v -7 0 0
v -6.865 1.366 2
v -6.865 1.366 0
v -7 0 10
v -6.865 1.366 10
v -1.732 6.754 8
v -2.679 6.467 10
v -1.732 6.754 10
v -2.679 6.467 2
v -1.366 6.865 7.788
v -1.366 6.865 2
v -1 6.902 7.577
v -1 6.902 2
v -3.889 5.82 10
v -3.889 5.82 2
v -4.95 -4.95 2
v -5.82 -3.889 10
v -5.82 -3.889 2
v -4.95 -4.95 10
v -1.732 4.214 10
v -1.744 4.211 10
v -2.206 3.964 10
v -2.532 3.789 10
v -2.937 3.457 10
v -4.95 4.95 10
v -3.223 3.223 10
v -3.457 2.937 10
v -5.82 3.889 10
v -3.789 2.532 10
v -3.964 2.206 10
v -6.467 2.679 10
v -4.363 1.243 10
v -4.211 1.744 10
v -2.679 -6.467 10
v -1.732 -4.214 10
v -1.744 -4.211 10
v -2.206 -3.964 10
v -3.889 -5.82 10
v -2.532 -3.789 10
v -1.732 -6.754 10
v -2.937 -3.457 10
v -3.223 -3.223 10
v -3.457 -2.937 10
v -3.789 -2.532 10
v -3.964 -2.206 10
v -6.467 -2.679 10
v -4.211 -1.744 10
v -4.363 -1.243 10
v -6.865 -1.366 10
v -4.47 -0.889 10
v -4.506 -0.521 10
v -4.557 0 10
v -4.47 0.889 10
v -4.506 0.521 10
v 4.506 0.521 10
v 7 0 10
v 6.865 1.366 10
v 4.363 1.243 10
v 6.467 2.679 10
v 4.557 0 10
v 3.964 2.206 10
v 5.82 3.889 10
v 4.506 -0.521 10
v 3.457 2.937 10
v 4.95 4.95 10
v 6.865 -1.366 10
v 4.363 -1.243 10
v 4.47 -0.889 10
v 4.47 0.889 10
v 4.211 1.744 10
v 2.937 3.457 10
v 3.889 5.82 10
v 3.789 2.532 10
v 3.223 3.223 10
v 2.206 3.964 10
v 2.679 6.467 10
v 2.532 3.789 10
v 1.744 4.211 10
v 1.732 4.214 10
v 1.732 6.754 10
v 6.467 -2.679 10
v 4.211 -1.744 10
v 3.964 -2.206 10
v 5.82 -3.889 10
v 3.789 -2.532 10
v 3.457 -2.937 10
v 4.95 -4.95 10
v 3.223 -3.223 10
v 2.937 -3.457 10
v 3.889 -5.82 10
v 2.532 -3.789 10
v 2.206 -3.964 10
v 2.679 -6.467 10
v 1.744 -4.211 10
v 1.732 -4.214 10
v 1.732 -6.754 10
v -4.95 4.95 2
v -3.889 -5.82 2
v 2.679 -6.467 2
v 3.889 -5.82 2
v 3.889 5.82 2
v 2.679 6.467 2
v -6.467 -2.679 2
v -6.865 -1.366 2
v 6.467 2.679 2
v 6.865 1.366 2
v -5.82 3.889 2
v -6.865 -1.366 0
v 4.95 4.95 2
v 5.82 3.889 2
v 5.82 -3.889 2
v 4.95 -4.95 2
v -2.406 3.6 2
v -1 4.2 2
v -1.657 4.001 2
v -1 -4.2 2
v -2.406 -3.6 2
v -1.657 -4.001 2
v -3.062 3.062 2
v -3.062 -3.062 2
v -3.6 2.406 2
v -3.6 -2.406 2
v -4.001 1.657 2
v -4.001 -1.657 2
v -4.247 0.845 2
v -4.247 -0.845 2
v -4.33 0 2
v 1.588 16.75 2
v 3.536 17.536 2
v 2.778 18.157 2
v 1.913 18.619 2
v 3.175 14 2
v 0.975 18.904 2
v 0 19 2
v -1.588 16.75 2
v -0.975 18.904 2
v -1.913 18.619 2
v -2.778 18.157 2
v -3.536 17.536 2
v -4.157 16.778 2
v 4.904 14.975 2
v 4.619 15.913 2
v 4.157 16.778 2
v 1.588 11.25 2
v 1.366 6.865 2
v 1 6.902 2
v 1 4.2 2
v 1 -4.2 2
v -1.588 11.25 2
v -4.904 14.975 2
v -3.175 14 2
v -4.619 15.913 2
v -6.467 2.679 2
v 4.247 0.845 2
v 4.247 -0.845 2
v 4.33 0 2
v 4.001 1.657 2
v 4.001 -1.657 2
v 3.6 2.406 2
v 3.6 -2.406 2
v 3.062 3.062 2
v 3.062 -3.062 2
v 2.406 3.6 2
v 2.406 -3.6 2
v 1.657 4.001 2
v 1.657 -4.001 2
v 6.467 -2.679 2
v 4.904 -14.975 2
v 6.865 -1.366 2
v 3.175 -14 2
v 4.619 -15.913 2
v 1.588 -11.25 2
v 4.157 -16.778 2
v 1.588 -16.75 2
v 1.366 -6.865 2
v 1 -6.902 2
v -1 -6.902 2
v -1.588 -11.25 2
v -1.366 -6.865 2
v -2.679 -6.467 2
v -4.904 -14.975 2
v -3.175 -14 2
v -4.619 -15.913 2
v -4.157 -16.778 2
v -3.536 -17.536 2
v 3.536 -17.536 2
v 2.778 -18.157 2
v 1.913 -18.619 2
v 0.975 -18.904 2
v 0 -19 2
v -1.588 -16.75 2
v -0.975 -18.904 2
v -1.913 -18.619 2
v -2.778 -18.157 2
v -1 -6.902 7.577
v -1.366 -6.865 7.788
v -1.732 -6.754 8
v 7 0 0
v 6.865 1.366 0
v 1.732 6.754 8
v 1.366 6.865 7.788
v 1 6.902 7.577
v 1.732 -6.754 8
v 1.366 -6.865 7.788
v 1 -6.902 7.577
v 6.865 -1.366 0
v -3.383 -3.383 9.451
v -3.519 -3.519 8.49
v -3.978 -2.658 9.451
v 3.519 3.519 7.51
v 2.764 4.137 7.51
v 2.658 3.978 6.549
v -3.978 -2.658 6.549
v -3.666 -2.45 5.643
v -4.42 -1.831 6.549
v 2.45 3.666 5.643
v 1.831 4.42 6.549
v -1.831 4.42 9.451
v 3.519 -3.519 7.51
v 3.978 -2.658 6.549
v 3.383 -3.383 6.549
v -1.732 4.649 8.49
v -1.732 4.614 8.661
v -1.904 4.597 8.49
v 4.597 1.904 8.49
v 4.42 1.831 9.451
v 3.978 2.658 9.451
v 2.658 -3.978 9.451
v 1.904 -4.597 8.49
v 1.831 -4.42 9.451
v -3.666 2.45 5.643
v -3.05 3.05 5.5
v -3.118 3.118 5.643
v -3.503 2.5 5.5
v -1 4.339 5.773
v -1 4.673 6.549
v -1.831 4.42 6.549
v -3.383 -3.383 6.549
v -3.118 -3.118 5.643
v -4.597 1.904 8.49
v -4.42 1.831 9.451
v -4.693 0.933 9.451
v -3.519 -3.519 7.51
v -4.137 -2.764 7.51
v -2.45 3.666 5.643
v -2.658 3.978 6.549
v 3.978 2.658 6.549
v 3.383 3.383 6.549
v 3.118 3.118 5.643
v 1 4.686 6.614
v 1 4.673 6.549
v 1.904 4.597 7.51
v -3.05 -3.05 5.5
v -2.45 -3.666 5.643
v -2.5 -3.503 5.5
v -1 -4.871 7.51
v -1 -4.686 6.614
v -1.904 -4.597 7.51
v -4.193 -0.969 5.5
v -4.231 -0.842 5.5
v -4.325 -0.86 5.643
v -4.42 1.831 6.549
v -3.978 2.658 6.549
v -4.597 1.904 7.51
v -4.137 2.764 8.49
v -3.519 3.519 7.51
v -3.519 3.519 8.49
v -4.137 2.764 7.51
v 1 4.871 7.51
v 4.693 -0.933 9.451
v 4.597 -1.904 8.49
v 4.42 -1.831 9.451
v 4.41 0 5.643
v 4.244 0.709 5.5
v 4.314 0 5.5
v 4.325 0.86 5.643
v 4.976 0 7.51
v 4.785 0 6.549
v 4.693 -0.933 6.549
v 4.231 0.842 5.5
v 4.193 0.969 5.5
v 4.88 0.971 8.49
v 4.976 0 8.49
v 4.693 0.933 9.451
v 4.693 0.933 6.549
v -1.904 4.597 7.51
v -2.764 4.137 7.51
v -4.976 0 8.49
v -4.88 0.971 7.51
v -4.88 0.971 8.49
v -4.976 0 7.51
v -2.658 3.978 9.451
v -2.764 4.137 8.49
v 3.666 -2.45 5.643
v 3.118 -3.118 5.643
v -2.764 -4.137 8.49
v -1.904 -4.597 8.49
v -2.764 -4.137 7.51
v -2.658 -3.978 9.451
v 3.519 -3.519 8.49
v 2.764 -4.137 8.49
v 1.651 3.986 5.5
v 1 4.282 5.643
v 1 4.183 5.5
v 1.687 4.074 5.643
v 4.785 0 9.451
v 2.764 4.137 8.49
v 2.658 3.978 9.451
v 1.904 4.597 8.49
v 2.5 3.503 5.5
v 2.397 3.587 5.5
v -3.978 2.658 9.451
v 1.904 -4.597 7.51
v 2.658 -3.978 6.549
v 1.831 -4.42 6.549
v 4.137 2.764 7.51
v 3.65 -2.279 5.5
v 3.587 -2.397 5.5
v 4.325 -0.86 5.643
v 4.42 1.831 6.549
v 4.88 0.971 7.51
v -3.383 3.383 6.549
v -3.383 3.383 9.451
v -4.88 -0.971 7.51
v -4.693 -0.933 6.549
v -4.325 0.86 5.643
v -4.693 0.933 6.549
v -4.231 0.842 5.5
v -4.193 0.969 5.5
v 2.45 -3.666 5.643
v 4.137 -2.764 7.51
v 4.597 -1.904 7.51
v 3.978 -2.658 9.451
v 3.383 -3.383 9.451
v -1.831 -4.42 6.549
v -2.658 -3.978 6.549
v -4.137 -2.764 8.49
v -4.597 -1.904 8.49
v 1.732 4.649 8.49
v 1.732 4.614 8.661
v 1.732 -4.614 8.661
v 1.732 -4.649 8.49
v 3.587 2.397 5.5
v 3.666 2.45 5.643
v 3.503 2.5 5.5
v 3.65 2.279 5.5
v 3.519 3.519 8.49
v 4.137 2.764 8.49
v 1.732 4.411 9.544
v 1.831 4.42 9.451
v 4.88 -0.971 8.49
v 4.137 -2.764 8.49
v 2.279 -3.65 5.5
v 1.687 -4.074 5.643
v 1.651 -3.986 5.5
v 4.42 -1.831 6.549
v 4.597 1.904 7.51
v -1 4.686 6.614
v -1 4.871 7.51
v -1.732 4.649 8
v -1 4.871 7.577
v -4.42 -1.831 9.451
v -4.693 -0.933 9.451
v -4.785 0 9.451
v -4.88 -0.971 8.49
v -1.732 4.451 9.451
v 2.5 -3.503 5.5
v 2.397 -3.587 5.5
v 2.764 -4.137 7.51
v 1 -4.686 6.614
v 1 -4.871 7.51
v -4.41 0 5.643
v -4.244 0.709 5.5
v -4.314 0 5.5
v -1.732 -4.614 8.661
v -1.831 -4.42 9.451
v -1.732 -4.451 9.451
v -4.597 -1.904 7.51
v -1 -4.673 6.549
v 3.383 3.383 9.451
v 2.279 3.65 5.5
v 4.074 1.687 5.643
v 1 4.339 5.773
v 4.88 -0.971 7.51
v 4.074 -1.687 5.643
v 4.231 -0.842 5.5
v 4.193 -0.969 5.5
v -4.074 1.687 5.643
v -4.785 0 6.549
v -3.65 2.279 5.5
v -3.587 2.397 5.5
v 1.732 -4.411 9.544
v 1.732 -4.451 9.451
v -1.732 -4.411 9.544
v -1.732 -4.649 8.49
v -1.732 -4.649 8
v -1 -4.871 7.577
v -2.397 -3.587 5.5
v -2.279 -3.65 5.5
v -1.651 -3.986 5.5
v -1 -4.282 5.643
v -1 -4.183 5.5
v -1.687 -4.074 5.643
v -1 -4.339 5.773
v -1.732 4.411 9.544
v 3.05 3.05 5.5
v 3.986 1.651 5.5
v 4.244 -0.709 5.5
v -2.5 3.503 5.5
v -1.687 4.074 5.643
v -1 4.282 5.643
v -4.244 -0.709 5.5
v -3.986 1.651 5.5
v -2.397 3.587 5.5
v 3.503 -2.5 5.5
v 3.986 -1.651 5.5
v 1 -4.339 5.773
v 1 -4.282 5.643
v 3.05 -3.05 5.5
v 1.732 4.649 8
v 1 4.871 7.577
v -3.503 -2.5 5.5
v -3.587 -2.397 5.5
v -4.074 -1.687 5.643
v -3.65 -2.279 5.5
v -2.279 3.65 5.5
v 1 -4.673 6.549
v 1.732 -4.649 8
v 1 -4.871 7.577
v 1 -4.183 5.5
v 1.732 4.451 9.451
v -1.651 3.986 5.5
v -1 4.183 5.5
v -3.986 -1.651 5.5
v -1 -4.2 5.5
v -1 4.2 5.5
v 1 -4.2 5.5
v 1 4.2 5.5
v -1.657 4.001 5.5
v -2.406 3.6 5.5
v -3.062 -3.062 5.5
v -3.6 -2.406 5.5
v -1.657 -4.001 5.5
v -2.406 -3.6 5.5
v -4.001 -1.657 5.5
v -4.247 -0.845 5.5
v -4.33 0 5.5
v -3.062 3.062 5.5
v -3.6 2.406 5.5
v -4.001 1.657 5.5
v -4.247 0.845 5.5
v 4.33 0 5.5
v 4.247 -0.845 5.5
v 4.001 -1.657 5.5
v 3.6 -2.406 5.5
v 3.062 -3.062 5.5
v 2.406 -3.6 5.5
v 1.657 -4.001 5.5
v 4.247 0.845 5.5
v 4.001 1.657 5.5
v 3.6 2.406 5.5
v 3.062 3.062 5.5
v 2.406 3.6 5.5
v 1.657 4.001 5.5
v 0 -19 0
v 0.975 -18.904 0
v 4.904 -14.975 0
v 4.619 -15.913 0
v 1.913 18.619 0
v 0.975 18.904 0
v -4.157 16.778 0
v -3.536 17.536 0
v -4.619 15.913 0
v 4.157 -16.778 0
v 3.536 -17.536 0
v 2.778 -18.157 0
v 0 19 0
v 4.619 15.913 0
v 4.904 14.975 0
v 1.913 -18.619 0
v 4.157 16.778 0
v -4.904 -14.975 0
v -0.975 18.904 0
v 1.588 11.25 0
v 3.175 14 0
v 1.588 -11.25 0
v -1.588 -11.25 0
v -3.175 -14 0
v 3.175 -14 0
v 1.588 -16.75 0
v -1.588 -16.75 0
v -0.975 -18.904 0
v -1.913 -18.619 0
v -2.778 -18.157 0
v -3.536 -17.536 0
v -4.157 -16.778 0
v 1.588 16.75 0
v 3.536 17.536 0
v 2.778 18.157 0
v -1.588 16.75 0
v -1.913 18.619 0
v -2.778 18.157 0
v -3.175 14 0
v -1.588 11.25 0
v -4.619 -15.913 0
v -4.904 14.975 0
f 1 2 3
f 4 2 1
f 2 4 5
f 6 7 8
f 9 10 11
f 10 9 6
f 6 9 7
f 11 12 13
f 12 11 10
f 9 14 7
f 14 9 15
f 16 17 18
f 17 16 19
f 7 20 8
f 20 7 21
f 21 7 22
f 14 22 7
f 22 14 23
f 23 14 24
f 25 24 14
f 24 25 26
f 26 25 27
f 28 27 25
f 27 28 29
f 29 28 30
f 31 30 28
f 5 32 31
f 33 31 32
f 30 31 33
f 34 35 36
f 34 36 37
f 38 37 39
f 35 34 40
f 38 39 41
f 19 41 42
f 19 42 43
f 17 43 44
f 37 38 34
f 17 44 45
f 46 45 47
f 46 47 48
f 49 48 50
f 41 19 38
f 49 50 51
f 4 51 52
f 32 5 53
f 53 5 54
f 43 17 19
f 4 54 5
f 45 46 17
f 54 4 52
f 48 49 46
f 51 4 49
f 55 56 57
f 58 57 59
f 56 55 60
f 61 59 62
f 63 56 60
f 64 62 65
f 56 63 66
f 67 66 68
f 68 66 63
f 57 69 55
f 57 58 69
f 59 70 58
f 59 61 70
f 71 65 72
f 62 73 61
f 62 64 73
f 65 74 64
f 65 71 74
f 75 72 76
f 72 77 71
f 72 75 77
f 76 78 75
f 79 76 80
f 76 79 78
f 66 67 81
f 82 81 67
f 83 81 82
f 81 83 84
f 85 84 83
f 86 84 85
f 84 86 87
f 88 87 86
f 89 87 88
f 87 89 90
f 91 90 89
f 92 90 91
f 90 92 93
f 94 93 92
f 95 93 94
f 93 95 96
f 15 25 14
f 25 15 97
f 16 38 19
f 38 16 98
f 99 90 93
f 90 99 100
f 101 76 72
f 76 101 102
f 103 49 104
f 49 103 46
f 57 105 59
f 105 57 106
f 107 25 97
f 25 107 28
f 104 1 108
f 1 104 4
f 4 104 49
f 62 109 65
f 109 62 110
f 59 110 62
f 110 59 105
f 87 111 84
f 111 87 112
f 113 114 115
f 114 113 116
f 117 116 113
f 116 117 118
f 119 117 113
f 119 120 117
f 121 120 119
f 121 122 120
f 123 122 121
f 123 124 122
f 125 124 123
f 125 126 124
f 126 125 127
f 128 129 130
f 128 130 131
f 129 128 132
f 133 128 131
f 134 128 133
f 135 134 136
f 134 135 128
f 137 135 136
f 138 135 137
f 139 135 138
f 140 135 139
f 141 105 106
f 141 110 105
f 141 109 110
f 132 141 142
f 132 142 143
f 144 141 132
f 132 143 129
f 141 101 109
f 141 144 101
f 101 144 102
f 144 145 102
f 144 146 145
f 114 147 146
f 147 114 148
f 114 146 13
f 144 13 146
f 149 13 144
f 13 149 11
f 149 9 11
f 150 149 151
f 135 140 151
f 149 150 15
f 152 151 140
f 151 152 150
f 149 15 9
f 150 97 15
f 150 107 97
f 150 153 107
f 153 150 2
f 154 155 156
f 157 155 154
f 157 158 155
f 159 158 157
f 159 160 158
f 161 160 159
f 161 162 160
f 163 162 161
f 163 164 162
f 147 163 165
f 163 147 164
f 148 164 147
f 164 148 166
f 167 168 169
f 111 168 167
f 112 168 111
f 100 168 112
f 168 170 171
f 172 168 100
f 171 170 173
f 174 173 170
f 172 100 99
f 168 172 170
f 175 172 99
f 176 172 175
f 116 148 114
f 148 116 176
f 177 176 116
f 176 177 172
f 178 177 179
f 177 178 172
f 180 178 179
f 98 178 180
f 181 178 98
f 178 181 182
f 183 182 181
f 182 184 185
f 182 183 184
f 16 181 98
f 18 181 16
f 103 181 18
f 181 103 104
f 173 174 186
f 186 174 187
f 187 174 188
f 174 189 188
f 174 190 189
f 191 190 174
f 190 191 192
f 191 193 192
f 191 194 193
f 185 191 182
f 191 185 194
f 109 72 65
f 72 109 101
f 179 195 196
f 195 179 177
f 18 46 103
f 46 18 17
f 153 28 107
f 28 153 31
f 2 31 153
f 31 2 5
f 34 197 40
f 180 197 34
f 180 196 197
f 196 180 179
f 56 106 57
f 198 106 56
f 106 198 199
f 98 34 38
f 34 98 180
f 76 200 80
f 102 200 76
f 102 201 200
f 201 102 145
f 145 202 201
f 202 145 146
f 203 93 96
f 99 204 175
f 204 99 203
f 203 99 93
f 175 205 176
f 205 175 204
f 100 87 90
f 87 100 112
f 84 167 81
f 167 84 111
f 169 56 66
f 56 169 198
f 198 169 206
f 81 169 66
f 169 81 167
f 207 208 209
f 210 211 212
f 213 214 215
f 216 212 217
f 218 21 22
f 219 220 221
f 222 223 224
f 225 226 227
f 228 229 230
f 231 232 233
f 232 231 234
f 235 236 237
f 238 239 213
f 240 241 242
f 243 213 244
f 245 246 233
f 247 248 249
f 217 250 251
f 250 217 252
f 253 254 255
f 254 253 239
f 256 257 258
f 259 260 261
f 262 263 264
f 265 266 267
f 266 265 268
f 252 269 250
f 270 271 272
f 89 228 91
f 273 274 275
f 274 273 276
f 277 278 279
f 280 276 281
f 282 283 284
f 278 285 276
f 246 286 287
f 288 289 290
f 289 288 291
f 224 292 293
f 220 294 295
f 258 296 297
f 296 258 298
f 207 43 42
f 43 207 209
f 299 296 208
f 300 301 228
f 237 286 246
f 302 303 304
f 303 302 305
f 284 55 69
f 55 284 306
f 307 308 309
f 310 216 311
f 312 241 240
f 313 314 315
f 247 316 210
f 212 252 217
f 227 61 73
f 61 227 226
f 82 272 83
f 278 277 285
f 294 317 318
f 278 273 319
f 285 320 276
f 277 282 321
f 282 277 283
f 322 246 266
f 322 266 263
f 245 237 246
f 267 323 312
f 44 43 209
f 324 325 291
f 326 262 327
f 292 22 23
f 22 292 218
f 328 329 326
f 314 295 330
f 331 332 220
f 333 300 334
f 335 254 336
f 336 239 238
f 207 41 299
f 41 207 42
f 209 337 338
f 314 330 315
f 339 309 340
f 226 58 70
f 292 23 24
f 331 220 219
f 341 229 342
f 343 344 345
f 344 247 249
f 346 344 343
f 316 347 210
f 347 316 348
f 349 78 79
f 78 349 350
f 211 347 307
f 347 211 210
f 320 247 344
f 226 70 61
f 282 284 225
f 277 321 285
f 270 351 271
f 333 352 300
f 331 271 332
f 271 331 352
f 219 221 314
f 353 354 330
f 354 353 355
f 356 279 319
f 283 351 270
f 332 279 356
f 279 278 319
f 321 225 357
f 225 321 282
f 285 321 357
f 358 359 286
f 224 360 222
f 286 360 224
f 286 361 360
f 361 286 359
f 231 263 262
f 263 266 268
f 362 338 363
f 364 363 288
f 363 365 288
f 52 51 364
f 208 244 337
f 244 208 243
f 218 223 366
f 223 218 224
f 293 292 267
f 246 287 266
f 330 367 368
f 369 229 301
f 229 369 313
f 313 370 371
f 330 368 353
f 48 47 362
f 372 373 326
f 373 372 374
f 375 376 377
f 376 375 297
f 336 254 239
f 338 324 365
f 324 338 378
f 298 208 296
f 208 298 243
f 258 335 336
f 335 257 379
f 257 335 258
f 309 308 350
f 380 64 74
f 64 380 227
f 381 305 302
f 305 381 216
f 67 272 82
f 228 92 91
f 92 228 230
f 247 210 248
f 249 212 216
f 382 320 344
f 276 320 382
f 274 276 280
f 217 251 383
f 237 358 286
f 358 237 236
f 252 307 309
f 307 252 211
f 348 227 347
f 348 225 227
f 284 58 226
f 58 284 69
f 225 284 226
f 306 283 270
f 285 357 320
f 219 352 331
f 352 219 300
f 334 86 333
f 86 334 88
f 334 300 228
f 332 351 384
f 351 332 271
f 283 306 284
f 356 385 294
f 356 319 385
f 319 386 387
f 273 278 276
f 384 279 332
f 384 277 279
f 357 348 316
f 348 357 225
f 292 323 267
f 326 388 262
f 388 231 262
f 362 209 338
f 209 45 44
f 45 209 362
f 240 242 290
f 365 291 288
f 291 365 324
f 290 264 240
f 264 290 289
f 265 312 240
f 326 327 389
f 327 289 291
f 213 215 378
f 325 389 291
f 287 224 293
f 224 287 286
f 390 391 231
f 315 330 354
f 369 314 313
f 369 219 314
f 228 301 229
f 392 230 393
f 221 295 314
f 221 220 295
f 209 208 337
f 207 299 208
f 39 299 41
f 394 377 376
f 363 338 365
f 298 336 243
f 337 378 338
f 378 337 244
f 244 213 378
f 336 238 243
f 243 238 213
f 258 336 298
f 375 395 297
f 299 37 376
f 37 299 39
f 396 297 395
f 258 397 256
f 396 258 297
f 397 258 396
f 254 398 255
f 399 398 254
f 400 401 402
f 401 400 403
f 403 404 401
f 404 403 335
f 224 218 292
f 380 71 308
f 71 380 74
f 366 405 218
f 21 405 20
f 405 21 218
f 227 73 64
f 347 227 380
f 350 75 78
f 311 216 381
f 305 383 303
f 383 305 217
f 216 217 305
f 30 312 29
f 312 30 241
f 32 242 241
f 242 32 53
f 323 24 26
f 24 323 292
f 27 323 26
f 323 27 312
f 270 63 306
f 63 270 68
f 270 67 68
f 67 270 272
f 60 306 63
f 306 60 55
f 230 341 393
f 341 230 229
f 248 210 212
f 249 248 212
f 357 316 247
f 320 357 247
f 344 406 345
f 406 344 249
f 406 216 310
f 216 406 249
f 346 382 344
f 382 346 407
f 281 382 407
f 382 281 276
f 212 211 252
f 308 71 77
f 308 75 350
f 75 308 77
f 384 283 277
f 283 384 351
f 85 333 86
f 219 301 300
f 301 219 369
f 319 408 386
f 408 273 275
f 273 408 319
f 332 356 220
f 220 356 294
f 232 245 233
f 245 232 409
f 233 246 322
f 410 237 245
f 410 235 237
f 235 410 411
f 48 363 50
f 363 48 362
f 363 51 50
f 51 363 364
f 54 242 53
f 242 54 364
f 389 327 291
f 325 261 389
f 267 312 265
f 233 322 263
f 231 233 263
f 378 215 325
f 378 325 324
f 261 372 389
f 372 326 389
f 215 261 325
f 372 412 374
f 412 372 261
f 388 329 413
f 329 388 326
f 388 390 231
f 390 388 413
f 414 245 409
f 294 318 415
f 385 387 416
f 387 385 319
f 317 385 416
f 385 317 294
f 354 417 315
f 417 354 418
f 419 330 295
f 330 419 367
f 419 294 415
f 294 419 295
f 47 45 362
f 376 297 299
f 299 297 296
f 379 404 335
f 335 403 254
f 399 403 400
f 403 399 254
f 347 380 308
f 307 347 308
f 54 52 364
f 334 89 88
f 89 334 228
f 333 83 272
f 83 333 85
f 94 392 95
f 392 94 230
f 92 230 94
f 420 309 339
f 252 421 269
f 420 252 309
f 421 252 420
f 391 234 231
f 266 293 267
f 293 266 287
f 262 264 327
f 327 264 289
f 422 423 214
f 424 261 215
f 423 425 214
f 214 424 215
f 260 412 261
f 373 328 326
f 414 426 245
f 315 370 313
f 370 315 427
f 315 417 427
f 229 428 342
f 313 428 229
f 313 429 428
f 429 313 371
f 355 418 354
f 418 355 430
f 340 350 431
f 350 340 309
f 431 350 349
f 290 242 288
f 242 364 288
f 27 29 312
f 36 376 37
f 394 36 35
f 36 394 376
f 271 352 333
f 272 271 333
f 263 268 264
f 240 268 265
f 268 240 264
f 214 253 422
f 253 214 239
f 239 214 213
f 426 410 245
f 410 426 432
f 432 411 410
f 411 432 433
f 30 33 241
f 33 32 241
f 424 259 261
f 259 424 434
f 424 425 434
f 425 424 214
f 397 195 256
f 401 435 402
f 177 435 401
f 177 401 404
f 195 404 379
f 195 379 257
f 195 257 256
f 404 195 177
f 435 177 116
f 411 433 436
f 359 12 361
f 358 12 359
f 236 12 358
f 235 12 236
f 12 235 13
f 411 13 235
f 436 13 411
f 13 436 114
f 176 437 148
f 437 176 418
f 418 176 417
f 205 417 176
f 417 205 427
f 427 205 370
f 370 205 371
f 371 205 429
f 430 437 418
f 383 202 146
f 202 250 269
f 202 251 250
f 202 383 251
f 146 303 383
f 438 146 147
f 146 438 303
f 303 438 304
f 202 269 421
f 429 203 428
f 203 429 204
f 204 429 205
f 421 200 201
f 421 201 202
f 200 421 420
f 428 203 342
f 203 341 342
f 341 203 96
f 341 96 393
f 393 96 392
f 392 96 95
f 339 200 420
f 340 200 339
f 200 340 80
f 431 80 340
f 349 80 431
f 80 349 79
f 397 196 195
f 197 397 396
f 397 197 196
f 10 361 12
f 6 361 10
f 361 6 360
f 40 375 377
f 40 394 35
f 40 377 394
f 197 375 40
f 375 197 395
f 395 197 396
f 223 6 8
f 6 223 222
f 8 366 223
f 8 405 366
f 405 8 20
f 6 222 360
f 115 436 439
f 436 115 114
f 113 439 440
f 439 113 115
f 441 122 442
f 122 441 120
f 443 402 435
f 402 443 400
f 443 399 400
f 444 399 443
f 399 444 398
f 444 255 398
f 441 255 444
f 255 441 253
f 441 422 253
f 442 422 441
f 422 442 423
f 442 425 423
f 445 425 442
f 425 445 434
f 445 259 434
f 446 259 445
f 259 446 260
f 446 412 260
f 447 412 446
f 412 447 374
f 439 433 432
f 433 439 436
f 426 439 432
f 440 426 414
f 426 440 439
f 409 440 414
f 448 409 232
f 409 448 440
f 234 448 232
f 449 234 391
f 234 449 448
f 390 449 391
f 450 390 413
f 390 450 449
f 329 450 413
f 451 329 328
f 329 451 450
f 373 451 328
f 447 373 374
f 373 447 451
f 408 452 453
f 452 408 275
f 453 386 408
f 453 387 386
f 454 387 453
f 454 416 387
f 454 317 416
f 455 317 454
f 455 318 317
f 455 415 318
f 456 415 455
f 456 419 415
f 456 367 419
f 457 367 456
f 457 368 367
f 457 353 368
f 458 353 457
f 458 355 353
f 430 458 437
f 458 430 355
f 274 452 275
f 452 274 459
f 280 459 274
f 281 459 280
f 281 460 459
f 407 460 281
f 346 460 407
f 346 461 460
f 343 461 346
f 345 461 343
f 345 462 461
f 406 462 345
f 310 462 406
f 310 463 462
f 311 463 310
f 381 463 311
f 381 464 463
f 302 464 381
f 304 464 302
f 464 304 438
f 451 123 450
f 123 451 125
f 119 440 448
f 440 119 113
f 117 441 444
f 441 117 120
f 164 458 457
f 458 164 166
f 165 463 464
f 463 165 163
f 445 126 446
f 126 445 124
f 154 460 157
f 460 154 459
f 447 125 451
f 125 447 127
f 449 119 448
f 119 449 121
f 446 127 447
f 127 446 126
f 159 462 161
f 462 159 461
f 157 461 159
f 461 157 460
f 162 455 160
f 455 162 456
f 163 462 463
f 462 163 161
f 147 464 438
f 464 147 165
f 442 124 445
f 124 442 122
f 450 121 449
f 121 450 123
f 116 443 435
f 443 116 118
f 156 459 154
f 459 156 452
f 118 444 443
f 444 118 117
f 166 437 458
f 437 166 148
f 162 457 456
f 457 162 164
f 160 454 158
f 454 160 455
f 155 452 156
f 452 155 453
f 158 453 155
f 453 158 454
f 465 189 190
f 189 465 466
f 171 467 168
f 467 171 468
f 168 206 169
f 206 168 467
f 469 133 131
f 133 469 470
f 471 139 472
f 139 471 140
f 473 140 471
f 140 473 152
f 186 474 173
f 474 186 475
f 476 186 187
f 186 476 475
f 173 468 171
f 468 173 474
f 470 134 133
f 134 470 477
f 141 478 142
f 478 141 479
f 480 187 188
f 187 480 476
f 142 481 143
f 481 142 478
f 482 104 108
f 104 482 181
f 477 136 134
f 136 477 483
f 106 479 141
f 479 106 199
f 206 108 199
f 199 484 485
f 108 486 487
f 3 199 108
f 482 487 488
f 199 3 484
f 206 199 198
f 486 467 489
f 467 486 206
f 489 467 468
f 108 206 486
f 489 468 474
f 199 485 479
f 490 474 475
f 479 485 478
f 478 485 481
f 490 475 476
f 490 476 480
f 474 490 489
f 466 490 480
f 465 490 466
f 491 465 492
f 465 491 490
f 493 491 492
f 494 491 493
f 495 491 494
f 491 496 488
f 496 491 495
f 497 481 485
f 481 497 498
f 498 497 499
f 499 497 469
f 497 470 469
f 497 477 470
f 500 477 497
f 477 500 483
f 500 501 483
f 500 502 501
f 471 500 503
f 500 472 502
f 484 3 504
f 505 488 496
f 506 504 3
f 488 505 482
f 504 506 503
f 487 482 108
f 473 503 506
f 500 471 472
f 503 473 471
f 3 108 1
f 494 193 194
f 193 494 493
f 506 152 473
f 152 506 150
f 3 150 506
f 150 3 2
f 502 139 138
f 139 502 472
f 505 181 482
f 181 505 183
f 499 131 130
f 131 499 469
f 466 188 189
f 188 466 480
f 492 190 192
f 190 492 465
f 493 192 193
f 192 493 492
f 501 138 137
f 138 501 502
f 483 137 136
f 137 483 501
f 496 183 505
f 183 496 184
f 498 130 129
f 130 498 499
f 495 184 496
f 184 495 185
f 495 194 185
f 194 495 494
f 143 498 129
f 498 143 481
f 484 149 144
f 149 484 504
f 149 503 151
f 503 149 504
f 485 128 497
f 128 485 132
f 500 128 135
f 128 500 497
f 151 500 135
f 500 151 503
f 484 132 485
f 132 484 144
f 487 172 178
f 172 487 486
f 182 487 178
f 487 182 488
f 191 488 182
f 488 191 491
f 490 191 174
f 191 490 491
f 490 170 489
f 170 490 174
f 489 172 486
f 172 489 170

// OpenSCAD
// file: oem/generic/standoffs.scad
include <lib.scad>;

use <third_party/threads.scad>;

function pvMetricHexStandoffDatasheet(length, width, hole_diameter=0, thread_pitch=0) =
     assert(length > 0)
     assert(width > 0)
     assert(hole_diameter >= 0)
     assert(width > hole_diameter)
     assert(thread_pitch >= 0)
     [["length", length], ["width", width], ["hole_diameter", hole_diameter], ["thread_pitch", thread_pitch]];


module pmMetricHexStandoff(datasheet) {
     width = property(datasheet, "width");
     length = property(datasheet, "length");
     hole_diameter = property(datasheet, "hole_diameter");
     thread_pitch = property(datasheet, "thread_pitch");
     difference() {
          cylinder(d=width / cos(30), h=length, $fn=6);
          translate([0, 0, -length/2]) {
               if (hole_diameter > 0) {
                    if (thread_pitch > 0) {
                         metric_thread(diameter=hole_diameter, pitch=thread_pitch,
                                       length=2 * length, internal=true);
                    } else {
                         cylinder(d=hole_diameter, h=2 * length);
                    }
               }
          }
     }
}

pmMetricHexStandoff(
     datasheet=pvMetricHexStandoffDatasheet(
          length=20, width=5, hole_diameter=3, thread_pitch=1
     )
);
// file: oem/generic/lib.scad
$fn = 32;

kEpsilon = 1e-1;

function property(table, key) = table[search([key], table)[0]][1];

module sector(radius, angles, fn = $fn) {
     r = radius / cos(180 / fn);
     step = -360 / fn;

     points = concat([[0, 0]],
                     [for(a = [angles[0] : step : angles[1] - 360])
                               [r * cos(a), r * sin(a)]
                          ],
                     [[r * cos(angles[1]), r * sin(angles[1])]]
          );

     difference() {
          circle(radius, $fn = fn);
          polygon(points);
     }
}

module ring(inner_radius, outer_radius, angles = [0, 360], fn = $fn) {
     difference() {
          sector(radius=outer_radius, angles=angles, fn=fn);
          sector(radius=inner_radius, angles=angles+[-kEpsilon, kEpsilon], fn=fn);
     }
}

module rounded_ring(inner_radius, outer_radius, angles = [0, 360], fn = $fn) {
     step_angle = 360 / fn;
     ring_width = outer_radius - inner_radius;
     ring_mean_radius = (outer_radius + inner_radius) / 2;
     for (theta = angles) {
          theta_d = theta / step_angle;
          theta_frac = (theta_d - floor(theta_d) - 0.5) * step_angle;
          rho = ring_mean_radius * cos(step_angle/2) / cos(theta_frac);
          rotate(theta)
          translate([rho, 0])
          circle(d=ring_width);
     }
     ring(inner_radius=inner_radius,
          outer_radius=outer_radius,
          angles=angles, fn=fn);
}

module fillet(r) {
     difference() {
          difference() {
               offset(r=-r - kEpsilon)
                    offset(delta=r) {
                    children();
               }
               offset(r=r)
                    offset(delta=-r) {
                    children();
               }
          }
          children();
     }
     offset(r=r)
          offset(delta=-r) {
          children();
     }
}

module bench_fillet(r, order=1000) {
     difference() {
          fillet(r) {
               translate([-order/2-kEpsilon, 0]) {
                    square([order, order], center=true);
               }
               children();
          }
          translate([-order/2-kEpsilon, 0]) {
               square([order+kEpsilon, order+kEpsilon], center=true);
          }
     }
}

module curved_bench_fillet(r, bench_radius, order=1000, internal=true) {
     difference() {
          fillet(r) {
               if (internal) {
                    translate([bench_radius, 0]) {
                         ring(inner_radius=bench_radius + kEpsilon, outer_radius=bench_radius * order);
                    }
               } else {
                    translate([-bench_radius, 0]) circle(r=bench_radius - kEpsilon);
               }
               children();
          }
          if (internal) {
               translate([bench_radius, 0]) {
                    ring(inner_radius=bench_radius,
                         outer_radius=bench_radius * order - kEpsilon);
               }
          } else {
               translate([-bench_radius, 0]) circle(r=bench_radius);
          }

     }
}


module window(side, position=[0, 0, 0], order=1000) {
    difference() {
        children();
        translate(position)  {
            difference() {
                square(order, center=true);
                square(side, center=true);
            }
        }
    }
}


module rounded_cylinder(diameter, height, fillet_radius, center) {
     translate([0, 0, ! center ? height/2 : 0]) {
          minkowski() {
               cylinder(d=(diameter - 2 * fillet_radius),
                        h=(height - 2 * fillet_radius),
                        center=true);
               sphere(r=fillet_radius);
          }
     }
}


module curved_support_xsection(support_radius, fillet_radius,
                               wall_inner_radius, wall_outer_radius,
                               hole_radius = 0, internal=true) {
     support_angular_width = (4 * support_radius / wall_outer_radius) * 180 / PI;
     wall_thickness = wall_outer_radius - wall_inner_radius;
     rotate([0, 0, internal ? 180 : 0]) {
          difference() {
               window(6*support_radius) {
                    curved_bench_fillet(fillet_radius, bench_radius=wall_inner_radius, internal=internal) {
                         hull() {
                              translate([support_radius + wall_thickness/2, 0]) {
                                   circle(r=support_radius);
                              }
                              rotate([0, 0, ! internal ? 180 : 0])
                              translate([wall_inner_radius + wall_thickness/2, 0]) {
                                   ring(inner_radius=wall_inner_radius,
                                        outer_radius=wall_outer_radius,
                                        angles=[180 - support_angular_width/2,
                                                180 + support_angular_width/2]);
                              }
                         }
                         rotate([0, 0, ! internal ? 180 : 0])
                         translate([wall_inner_radius + wall_thickness/2, 0]) {
                              ring(inner_radius=wall_inner_radius,
                                   outer_radius=wall_outer_radius,
                                   angles=[180 - support_angular_width,
                                           180 + support_angular_width]);
                         }
                    }
               }
               if (hole_radius > 0) {
                    translate([support_radius + wall_thickness/2, 0]) {
                         circle(r=hole_radius);
                    }
               }
          }
     }
}

module fill(upto=1000) {
     offset(delta=-upto) {
          offset(delta=upto) {
               children();
          }
     }
}

module outline(delta) {
     if (delta > 0) {
          difference() {
               offset(delta=delta) {
                    children();
               }
               children();
          }
     } else {
          difference() {
               children();
               offset(delta=delta) {
                    children();
               }
          }
     }
}

module duplicate(v) {
     children();
     mirror(v) children();
}

function steps(start, end, n) = [start:(end - start)/(n - 1):end];

function sigmoid(x) = 1.0 / (1.0 + exp(-x));

module sigmoid_profile(length, width, order=10, fn = $fn) {
     step = length / fn;
     points = concat(
          [[0, 0]],
          [for (x = [step:step:length-step]) [x, width * sigmoid(2 * order * ((x / length) - 0.5))]],
          [[length, width], [0, width]]

     );
     polygon(points=points);
}

module exp_nerve_xsection(height, length, decay_rate = 5, fn = $fn) {
     step = length / fn;
     points = concat(
          [[0, 0]],
          [for (x = [0:step:length-step]) [x, height * exp(-x/decay_rate)]],
          [[length, 0]]
          );
     polygon(points=points);
}

module exp_nerve(height, length, thickness, decay_rate = 3, fn = $fn) {
     rotate([90, 0, 0])
     linear_extrude(height=thickness, center=true) {
          exp_nerve_xsection(height, length, decay_rate, fn);
     }
}

module exp_corner_nerve(height, radius, angles, corner_radius = 0, decay_rate = 3, fn = $fn) {
     difference() {
          rotate_extrude() {
               if (corner_radius > 0) {
                    translate([corner_radius, 0, 0])
                    exp_nerve_xsection(height=height, length=radius, decay_rate=decay_rate, fn=fn);
               } else {
                    translate([-corner_radius, 0, 0])
                    mirror([1, 0, 0])
                    exp_nerve_xsection(height=height, length=radius, decay_rate=decay_rate, fn=fn);
               }
          }
          linear_extrude(height=2 * height, center=true) {
               sector(radius=radius + abs(corner_radius), angles=[angles[1], angles[0] + 360], fn=fn);
          }
     }
}
// file: generic/ball_caster_yoke.scad
include <lib.scad>;

function pvBallCasterYokeDatasheet(main_diameter, base_thickness, mount_offset, mount_diameter, mount_height=0) =
     assert(main_diameter > 0)
     assert(base_thickness > 0)
     assert(mount_offset > 0)
     assert(mount_diameter > 0)
     [["main_diameter", main_diameter], ["base_thickness", base_thickness],
      ["mount_offset", mount_offset], ["mount_diameter", mount_diameter],
      ["mount_height", mount_height], ["main_height", mount_height + base_thickness]];

module pmBallCasterYoke(datasheet) {
     main_diameter = property(datasheet, "main_diameter");
     base_thickness = property(datasheet, "base_thickness");
     mount_offset = property(datasheet, "mount_offset");
     mount_diameter = property(datasheet, "mount_diameter");
     mount_height = property(datasheet, "mount_height");

     linear_extrude(height=base_thickness) {
          hull() {
               circle(d=main_diameter);
               duplicate([0, 1, 0]) {
                    translate([0, mount_offset, 0]) {
                         circle(d=mount_diameter);
                    }
               }
          }
     }
     if (mount_height > 0) {
          translate([0, 0, base_thickness]) {
               duplicate([0, 1, 0]) {
                    translate([0, mount_offset, 0]) {
                         cylinder(h=mount_height, d=mount_diameter);
                    }
               }
          }
     }
}

pmBallCasterYoke(
     datasheet=pvBallCasterYokeDatasheet(
          main_diameter=12, base_thickness=2, mount_offset=10, mount_diameter=4, mount_height=5
     )
);
// file: oem/m3_hex_standoff.scad
include <generic/lib.scad>;

use <generic/standoffs.scad>;

function vM3x30mmHexThreadedStandoffDatasheet() =
     pvMetricHexStandoffDatasheet(hole_diameter=3, thread_pitch=0.5, length=30, width=5.5);

module mM3x30mmHexThreadedStandoff() {
     color("darkgoldenrod") render() pmMetricHexStandoff(datasheet=vM3x30mmHexThreadedStandoffDatasheet());
}

function vM3x30mmHexStandoffDatasheet() =
     pvMetricHexStandoffDatasheet(hole_diameter=3, length=30, width=5.5);

module mM3x30mmHexStandoff() {
     color("darkgoldenrod") render() pmMetricHexStandoff(datasheet=vM3x30mmHexStandoffDatasheet());
}


function vM3x40mmHexThreadedStandoffDatasheet() =
     pvMetricHexStandoffDatasheet(hole_diameter=3, thread_pitch=0.5, length=40, width=5.5);

module mM3x40mmHexThreadedStandoff() {
     color("darkgoldenrod") render() pmMetricHexStandoff(datasheet=vM3x40mmHexThreadedStandoffDatasheet());
}

function vM3x40mmHexStandoffDatasheet() =
     pvMetricHexStandoffDatasheet(hole_diameter=3, length=40, width=5.5);

module mM3x40mmHexStandoff() {
     color("darkgoldenrod") render() pmMetricHexStandoff(datasheet=vM3x40mmHexStandoffDatasheet());
}


function vM3x15mmHexThreadedStandoffDatasheet() =
     pvMetricHexStandoffDatasheet(hole_diameter=3, thread_pitch=0.5, length=15, width=5.5);

module mM3x15mmHexThreadedStandoff() {
     color("darkgoldenrod") render() pmMetricHexStandoff(datasheet=vM3x15mmHexThreadedStandoffDatasheet());
}

function vM3x15mmHexStandoffDatasheet() =
     pvMetricHexStandoffDatasheet(hole_diameter=3, length=15, width=5.5);

module mM3x15mmHexStandoff() {
     color("darkgoldenrod") render() pmMetricHexStandoff(datasheet=vM3x15mmHexStandoffDatasheet());
}

function vM3x10mmHexThreadedStandoffDatasheet() =
     pvMetricHexStandoffDatasheet(hole_diameter=3, thread_pitch=0.5, length=10, width=5.5);

module mM3x10mmHexThreadedStandoff() {
     color("darkgoldenrod") render() pmMetricHexStandoff(datasheet=vM3x10mmHexThreadedStandoffDatasheet());
}

function vM3x10mmHexStandoffDatasheet() =
     pvMetricHexStandoffDatasheet(hole_diameter=3, length=10, width=5.5);

module mM3x10mmHexStandoff() {
     color("darkgoldenrod") render() pmMetricHexStandoff(datasheet=vM3x10mmHexStandoffDatasheet());
}
// file: generic/ball_caster_support.scad
include <lib.scad>;

use <ball_caster_yoke.scad>;

function pvBallCasterSupportDatasheet(ball_diameter, ball_protrusion, ball_gap,
                                      wall_gap, wall_thickness, base_thickness,
                                      mount_offset, mount_diameter) =
     assert(ball_diameter > 0)
     assert(ball_protrusion > 0)
     assert(ball_diameter > ball_protrusion)
     assert(ball_gap > 0)
     assert(wall_gap > 0)
     assert(ball_diameter > 2 * wall_gap)
     assert(wall_thickness > 0)
     assert(base_thickness > 0)
     assert(mount_offset > ball_diameter/2)
     assert(mount_diameter > 0)
     [["ball_diameter", ball_diameter], ["ball_protrusion", ball_protrusion], ["ball_gap", ball_gap],
      ["wall_gap", wall_gap], ["wall_thickness", wall_thickness], ["base_thickness", base_thickness],
      ["mount_offset", mount_offset], ["mount_diameter", mount_diameter],
      ["ball_z_offset", base_thickness + ball_gap + ball_diameter / 2],
      ["main_height", base_thickness + ball_gap + ball_diameter - ball_protrusion],
      ["main_diameter", ball_diameter + 2 * wall_thickness]];

module pmBallCasterSupport(datasheet) {
     base_thickness = property(datasheet, "base_thickness");
     main_height = property(datasheet, "main_height");
     main_diameter = property(datasheet, "main_diameter");
     mount_offset = property(datasheet, "mount_offset");
     mount_diameter = property(datasheet, "mount_diameter");
     ball_diameter = property(datasheet, "ball_diameter");
     ball_protrusion = property(datasheet, "ball_protrusion");
     ball_gap = property(datasheet, "ball_gap");
     ball_z_offset = property(datasheet, "ball_z_offset");
     wall_gap = property(datasheet, "wall_gap");
     wall_thickness = property(datasheet, "wall_thickness");

     pmBallCasterYoke(datasheet);
     rotate([0, 0, 90]) {
          translate([0, 0, base_thickness]) {
               difference() {
                    cylinder(h=main_height - base_thickness, d=main_diameter);
                    translate([0, 0, ball_z_offset - base_thickness]) sphere(d=ball_diameter);
                    translate([-main_diameter / 2 - kEpsilon, -wall_gap / 2, 0]) {
                         cube([main_diameter + 2 * kEpsilon, wall_gap, main_height - base_thickness + kEpsilon]);
                    }
                    translate([-main_diameter/2 - kEpsilon, 0, main_height - base_thickness - wall_gap/2]) {
                         rotate([0, 90, 0]) cylinder(h=main_diameter + 2 * kEpsilon, d=2 * wall_gap, $fn=6);
                    }
                    cylinder(h=ball_diameter/4 + ball_gap, d=ball_diameter * sqrt(3)/2);
               }
          }
     }
}

pmBallCasterSupport(
     datasheet=pvBallCasterSupportDatasheet(
          ball_diameter=10, ball_protrusion=3, ball_gap=2,
          wall_gap=3, wall_thickness=2, base_thickness=2,
          mount_offset=10, mount_diameter=4
     )
);
// main file
include <generic/lib.scad>;

use <generic/ball_caster_support.scad>;

use <oem/m3_hex_standoff.scad>;

function v10mmBallCasterSupportDatasheet() =
     pvBallCasterSupportDatasheet(ball_diameter=10, ball_protrusion=3, ball_gap=1,
                                  wall_gap=2, wall_thickness=2, base_thickness=2,
                                  mount_offset=14, mount_diameter=10);

module m10mmBallCasterSupport() {
     datasheet = v10mmBallCasterSupportDatasheet();
     base_thickness = property(datasheet, "base_thickness");
     mount_offset = property(datasheet, "mount_offset");

     color($default_color) {
          render() {
               difference() {
                    pmBallCasterSupport(datasheet);
                    translate([0, 0, -kEpsilon]) {
                         duplicate([0, 1, 0]) {
                              translate([0, mount_offset, 0]) {
                                   linear_extrude(height=base_thickness + 2 * kEpsilon) {
                                        hull() projection() mM3x15mmHexStandoff();
                                   }
                              }
                         }
                    }
               }
          }
     }
}

m10mmBallCasterSupport();
